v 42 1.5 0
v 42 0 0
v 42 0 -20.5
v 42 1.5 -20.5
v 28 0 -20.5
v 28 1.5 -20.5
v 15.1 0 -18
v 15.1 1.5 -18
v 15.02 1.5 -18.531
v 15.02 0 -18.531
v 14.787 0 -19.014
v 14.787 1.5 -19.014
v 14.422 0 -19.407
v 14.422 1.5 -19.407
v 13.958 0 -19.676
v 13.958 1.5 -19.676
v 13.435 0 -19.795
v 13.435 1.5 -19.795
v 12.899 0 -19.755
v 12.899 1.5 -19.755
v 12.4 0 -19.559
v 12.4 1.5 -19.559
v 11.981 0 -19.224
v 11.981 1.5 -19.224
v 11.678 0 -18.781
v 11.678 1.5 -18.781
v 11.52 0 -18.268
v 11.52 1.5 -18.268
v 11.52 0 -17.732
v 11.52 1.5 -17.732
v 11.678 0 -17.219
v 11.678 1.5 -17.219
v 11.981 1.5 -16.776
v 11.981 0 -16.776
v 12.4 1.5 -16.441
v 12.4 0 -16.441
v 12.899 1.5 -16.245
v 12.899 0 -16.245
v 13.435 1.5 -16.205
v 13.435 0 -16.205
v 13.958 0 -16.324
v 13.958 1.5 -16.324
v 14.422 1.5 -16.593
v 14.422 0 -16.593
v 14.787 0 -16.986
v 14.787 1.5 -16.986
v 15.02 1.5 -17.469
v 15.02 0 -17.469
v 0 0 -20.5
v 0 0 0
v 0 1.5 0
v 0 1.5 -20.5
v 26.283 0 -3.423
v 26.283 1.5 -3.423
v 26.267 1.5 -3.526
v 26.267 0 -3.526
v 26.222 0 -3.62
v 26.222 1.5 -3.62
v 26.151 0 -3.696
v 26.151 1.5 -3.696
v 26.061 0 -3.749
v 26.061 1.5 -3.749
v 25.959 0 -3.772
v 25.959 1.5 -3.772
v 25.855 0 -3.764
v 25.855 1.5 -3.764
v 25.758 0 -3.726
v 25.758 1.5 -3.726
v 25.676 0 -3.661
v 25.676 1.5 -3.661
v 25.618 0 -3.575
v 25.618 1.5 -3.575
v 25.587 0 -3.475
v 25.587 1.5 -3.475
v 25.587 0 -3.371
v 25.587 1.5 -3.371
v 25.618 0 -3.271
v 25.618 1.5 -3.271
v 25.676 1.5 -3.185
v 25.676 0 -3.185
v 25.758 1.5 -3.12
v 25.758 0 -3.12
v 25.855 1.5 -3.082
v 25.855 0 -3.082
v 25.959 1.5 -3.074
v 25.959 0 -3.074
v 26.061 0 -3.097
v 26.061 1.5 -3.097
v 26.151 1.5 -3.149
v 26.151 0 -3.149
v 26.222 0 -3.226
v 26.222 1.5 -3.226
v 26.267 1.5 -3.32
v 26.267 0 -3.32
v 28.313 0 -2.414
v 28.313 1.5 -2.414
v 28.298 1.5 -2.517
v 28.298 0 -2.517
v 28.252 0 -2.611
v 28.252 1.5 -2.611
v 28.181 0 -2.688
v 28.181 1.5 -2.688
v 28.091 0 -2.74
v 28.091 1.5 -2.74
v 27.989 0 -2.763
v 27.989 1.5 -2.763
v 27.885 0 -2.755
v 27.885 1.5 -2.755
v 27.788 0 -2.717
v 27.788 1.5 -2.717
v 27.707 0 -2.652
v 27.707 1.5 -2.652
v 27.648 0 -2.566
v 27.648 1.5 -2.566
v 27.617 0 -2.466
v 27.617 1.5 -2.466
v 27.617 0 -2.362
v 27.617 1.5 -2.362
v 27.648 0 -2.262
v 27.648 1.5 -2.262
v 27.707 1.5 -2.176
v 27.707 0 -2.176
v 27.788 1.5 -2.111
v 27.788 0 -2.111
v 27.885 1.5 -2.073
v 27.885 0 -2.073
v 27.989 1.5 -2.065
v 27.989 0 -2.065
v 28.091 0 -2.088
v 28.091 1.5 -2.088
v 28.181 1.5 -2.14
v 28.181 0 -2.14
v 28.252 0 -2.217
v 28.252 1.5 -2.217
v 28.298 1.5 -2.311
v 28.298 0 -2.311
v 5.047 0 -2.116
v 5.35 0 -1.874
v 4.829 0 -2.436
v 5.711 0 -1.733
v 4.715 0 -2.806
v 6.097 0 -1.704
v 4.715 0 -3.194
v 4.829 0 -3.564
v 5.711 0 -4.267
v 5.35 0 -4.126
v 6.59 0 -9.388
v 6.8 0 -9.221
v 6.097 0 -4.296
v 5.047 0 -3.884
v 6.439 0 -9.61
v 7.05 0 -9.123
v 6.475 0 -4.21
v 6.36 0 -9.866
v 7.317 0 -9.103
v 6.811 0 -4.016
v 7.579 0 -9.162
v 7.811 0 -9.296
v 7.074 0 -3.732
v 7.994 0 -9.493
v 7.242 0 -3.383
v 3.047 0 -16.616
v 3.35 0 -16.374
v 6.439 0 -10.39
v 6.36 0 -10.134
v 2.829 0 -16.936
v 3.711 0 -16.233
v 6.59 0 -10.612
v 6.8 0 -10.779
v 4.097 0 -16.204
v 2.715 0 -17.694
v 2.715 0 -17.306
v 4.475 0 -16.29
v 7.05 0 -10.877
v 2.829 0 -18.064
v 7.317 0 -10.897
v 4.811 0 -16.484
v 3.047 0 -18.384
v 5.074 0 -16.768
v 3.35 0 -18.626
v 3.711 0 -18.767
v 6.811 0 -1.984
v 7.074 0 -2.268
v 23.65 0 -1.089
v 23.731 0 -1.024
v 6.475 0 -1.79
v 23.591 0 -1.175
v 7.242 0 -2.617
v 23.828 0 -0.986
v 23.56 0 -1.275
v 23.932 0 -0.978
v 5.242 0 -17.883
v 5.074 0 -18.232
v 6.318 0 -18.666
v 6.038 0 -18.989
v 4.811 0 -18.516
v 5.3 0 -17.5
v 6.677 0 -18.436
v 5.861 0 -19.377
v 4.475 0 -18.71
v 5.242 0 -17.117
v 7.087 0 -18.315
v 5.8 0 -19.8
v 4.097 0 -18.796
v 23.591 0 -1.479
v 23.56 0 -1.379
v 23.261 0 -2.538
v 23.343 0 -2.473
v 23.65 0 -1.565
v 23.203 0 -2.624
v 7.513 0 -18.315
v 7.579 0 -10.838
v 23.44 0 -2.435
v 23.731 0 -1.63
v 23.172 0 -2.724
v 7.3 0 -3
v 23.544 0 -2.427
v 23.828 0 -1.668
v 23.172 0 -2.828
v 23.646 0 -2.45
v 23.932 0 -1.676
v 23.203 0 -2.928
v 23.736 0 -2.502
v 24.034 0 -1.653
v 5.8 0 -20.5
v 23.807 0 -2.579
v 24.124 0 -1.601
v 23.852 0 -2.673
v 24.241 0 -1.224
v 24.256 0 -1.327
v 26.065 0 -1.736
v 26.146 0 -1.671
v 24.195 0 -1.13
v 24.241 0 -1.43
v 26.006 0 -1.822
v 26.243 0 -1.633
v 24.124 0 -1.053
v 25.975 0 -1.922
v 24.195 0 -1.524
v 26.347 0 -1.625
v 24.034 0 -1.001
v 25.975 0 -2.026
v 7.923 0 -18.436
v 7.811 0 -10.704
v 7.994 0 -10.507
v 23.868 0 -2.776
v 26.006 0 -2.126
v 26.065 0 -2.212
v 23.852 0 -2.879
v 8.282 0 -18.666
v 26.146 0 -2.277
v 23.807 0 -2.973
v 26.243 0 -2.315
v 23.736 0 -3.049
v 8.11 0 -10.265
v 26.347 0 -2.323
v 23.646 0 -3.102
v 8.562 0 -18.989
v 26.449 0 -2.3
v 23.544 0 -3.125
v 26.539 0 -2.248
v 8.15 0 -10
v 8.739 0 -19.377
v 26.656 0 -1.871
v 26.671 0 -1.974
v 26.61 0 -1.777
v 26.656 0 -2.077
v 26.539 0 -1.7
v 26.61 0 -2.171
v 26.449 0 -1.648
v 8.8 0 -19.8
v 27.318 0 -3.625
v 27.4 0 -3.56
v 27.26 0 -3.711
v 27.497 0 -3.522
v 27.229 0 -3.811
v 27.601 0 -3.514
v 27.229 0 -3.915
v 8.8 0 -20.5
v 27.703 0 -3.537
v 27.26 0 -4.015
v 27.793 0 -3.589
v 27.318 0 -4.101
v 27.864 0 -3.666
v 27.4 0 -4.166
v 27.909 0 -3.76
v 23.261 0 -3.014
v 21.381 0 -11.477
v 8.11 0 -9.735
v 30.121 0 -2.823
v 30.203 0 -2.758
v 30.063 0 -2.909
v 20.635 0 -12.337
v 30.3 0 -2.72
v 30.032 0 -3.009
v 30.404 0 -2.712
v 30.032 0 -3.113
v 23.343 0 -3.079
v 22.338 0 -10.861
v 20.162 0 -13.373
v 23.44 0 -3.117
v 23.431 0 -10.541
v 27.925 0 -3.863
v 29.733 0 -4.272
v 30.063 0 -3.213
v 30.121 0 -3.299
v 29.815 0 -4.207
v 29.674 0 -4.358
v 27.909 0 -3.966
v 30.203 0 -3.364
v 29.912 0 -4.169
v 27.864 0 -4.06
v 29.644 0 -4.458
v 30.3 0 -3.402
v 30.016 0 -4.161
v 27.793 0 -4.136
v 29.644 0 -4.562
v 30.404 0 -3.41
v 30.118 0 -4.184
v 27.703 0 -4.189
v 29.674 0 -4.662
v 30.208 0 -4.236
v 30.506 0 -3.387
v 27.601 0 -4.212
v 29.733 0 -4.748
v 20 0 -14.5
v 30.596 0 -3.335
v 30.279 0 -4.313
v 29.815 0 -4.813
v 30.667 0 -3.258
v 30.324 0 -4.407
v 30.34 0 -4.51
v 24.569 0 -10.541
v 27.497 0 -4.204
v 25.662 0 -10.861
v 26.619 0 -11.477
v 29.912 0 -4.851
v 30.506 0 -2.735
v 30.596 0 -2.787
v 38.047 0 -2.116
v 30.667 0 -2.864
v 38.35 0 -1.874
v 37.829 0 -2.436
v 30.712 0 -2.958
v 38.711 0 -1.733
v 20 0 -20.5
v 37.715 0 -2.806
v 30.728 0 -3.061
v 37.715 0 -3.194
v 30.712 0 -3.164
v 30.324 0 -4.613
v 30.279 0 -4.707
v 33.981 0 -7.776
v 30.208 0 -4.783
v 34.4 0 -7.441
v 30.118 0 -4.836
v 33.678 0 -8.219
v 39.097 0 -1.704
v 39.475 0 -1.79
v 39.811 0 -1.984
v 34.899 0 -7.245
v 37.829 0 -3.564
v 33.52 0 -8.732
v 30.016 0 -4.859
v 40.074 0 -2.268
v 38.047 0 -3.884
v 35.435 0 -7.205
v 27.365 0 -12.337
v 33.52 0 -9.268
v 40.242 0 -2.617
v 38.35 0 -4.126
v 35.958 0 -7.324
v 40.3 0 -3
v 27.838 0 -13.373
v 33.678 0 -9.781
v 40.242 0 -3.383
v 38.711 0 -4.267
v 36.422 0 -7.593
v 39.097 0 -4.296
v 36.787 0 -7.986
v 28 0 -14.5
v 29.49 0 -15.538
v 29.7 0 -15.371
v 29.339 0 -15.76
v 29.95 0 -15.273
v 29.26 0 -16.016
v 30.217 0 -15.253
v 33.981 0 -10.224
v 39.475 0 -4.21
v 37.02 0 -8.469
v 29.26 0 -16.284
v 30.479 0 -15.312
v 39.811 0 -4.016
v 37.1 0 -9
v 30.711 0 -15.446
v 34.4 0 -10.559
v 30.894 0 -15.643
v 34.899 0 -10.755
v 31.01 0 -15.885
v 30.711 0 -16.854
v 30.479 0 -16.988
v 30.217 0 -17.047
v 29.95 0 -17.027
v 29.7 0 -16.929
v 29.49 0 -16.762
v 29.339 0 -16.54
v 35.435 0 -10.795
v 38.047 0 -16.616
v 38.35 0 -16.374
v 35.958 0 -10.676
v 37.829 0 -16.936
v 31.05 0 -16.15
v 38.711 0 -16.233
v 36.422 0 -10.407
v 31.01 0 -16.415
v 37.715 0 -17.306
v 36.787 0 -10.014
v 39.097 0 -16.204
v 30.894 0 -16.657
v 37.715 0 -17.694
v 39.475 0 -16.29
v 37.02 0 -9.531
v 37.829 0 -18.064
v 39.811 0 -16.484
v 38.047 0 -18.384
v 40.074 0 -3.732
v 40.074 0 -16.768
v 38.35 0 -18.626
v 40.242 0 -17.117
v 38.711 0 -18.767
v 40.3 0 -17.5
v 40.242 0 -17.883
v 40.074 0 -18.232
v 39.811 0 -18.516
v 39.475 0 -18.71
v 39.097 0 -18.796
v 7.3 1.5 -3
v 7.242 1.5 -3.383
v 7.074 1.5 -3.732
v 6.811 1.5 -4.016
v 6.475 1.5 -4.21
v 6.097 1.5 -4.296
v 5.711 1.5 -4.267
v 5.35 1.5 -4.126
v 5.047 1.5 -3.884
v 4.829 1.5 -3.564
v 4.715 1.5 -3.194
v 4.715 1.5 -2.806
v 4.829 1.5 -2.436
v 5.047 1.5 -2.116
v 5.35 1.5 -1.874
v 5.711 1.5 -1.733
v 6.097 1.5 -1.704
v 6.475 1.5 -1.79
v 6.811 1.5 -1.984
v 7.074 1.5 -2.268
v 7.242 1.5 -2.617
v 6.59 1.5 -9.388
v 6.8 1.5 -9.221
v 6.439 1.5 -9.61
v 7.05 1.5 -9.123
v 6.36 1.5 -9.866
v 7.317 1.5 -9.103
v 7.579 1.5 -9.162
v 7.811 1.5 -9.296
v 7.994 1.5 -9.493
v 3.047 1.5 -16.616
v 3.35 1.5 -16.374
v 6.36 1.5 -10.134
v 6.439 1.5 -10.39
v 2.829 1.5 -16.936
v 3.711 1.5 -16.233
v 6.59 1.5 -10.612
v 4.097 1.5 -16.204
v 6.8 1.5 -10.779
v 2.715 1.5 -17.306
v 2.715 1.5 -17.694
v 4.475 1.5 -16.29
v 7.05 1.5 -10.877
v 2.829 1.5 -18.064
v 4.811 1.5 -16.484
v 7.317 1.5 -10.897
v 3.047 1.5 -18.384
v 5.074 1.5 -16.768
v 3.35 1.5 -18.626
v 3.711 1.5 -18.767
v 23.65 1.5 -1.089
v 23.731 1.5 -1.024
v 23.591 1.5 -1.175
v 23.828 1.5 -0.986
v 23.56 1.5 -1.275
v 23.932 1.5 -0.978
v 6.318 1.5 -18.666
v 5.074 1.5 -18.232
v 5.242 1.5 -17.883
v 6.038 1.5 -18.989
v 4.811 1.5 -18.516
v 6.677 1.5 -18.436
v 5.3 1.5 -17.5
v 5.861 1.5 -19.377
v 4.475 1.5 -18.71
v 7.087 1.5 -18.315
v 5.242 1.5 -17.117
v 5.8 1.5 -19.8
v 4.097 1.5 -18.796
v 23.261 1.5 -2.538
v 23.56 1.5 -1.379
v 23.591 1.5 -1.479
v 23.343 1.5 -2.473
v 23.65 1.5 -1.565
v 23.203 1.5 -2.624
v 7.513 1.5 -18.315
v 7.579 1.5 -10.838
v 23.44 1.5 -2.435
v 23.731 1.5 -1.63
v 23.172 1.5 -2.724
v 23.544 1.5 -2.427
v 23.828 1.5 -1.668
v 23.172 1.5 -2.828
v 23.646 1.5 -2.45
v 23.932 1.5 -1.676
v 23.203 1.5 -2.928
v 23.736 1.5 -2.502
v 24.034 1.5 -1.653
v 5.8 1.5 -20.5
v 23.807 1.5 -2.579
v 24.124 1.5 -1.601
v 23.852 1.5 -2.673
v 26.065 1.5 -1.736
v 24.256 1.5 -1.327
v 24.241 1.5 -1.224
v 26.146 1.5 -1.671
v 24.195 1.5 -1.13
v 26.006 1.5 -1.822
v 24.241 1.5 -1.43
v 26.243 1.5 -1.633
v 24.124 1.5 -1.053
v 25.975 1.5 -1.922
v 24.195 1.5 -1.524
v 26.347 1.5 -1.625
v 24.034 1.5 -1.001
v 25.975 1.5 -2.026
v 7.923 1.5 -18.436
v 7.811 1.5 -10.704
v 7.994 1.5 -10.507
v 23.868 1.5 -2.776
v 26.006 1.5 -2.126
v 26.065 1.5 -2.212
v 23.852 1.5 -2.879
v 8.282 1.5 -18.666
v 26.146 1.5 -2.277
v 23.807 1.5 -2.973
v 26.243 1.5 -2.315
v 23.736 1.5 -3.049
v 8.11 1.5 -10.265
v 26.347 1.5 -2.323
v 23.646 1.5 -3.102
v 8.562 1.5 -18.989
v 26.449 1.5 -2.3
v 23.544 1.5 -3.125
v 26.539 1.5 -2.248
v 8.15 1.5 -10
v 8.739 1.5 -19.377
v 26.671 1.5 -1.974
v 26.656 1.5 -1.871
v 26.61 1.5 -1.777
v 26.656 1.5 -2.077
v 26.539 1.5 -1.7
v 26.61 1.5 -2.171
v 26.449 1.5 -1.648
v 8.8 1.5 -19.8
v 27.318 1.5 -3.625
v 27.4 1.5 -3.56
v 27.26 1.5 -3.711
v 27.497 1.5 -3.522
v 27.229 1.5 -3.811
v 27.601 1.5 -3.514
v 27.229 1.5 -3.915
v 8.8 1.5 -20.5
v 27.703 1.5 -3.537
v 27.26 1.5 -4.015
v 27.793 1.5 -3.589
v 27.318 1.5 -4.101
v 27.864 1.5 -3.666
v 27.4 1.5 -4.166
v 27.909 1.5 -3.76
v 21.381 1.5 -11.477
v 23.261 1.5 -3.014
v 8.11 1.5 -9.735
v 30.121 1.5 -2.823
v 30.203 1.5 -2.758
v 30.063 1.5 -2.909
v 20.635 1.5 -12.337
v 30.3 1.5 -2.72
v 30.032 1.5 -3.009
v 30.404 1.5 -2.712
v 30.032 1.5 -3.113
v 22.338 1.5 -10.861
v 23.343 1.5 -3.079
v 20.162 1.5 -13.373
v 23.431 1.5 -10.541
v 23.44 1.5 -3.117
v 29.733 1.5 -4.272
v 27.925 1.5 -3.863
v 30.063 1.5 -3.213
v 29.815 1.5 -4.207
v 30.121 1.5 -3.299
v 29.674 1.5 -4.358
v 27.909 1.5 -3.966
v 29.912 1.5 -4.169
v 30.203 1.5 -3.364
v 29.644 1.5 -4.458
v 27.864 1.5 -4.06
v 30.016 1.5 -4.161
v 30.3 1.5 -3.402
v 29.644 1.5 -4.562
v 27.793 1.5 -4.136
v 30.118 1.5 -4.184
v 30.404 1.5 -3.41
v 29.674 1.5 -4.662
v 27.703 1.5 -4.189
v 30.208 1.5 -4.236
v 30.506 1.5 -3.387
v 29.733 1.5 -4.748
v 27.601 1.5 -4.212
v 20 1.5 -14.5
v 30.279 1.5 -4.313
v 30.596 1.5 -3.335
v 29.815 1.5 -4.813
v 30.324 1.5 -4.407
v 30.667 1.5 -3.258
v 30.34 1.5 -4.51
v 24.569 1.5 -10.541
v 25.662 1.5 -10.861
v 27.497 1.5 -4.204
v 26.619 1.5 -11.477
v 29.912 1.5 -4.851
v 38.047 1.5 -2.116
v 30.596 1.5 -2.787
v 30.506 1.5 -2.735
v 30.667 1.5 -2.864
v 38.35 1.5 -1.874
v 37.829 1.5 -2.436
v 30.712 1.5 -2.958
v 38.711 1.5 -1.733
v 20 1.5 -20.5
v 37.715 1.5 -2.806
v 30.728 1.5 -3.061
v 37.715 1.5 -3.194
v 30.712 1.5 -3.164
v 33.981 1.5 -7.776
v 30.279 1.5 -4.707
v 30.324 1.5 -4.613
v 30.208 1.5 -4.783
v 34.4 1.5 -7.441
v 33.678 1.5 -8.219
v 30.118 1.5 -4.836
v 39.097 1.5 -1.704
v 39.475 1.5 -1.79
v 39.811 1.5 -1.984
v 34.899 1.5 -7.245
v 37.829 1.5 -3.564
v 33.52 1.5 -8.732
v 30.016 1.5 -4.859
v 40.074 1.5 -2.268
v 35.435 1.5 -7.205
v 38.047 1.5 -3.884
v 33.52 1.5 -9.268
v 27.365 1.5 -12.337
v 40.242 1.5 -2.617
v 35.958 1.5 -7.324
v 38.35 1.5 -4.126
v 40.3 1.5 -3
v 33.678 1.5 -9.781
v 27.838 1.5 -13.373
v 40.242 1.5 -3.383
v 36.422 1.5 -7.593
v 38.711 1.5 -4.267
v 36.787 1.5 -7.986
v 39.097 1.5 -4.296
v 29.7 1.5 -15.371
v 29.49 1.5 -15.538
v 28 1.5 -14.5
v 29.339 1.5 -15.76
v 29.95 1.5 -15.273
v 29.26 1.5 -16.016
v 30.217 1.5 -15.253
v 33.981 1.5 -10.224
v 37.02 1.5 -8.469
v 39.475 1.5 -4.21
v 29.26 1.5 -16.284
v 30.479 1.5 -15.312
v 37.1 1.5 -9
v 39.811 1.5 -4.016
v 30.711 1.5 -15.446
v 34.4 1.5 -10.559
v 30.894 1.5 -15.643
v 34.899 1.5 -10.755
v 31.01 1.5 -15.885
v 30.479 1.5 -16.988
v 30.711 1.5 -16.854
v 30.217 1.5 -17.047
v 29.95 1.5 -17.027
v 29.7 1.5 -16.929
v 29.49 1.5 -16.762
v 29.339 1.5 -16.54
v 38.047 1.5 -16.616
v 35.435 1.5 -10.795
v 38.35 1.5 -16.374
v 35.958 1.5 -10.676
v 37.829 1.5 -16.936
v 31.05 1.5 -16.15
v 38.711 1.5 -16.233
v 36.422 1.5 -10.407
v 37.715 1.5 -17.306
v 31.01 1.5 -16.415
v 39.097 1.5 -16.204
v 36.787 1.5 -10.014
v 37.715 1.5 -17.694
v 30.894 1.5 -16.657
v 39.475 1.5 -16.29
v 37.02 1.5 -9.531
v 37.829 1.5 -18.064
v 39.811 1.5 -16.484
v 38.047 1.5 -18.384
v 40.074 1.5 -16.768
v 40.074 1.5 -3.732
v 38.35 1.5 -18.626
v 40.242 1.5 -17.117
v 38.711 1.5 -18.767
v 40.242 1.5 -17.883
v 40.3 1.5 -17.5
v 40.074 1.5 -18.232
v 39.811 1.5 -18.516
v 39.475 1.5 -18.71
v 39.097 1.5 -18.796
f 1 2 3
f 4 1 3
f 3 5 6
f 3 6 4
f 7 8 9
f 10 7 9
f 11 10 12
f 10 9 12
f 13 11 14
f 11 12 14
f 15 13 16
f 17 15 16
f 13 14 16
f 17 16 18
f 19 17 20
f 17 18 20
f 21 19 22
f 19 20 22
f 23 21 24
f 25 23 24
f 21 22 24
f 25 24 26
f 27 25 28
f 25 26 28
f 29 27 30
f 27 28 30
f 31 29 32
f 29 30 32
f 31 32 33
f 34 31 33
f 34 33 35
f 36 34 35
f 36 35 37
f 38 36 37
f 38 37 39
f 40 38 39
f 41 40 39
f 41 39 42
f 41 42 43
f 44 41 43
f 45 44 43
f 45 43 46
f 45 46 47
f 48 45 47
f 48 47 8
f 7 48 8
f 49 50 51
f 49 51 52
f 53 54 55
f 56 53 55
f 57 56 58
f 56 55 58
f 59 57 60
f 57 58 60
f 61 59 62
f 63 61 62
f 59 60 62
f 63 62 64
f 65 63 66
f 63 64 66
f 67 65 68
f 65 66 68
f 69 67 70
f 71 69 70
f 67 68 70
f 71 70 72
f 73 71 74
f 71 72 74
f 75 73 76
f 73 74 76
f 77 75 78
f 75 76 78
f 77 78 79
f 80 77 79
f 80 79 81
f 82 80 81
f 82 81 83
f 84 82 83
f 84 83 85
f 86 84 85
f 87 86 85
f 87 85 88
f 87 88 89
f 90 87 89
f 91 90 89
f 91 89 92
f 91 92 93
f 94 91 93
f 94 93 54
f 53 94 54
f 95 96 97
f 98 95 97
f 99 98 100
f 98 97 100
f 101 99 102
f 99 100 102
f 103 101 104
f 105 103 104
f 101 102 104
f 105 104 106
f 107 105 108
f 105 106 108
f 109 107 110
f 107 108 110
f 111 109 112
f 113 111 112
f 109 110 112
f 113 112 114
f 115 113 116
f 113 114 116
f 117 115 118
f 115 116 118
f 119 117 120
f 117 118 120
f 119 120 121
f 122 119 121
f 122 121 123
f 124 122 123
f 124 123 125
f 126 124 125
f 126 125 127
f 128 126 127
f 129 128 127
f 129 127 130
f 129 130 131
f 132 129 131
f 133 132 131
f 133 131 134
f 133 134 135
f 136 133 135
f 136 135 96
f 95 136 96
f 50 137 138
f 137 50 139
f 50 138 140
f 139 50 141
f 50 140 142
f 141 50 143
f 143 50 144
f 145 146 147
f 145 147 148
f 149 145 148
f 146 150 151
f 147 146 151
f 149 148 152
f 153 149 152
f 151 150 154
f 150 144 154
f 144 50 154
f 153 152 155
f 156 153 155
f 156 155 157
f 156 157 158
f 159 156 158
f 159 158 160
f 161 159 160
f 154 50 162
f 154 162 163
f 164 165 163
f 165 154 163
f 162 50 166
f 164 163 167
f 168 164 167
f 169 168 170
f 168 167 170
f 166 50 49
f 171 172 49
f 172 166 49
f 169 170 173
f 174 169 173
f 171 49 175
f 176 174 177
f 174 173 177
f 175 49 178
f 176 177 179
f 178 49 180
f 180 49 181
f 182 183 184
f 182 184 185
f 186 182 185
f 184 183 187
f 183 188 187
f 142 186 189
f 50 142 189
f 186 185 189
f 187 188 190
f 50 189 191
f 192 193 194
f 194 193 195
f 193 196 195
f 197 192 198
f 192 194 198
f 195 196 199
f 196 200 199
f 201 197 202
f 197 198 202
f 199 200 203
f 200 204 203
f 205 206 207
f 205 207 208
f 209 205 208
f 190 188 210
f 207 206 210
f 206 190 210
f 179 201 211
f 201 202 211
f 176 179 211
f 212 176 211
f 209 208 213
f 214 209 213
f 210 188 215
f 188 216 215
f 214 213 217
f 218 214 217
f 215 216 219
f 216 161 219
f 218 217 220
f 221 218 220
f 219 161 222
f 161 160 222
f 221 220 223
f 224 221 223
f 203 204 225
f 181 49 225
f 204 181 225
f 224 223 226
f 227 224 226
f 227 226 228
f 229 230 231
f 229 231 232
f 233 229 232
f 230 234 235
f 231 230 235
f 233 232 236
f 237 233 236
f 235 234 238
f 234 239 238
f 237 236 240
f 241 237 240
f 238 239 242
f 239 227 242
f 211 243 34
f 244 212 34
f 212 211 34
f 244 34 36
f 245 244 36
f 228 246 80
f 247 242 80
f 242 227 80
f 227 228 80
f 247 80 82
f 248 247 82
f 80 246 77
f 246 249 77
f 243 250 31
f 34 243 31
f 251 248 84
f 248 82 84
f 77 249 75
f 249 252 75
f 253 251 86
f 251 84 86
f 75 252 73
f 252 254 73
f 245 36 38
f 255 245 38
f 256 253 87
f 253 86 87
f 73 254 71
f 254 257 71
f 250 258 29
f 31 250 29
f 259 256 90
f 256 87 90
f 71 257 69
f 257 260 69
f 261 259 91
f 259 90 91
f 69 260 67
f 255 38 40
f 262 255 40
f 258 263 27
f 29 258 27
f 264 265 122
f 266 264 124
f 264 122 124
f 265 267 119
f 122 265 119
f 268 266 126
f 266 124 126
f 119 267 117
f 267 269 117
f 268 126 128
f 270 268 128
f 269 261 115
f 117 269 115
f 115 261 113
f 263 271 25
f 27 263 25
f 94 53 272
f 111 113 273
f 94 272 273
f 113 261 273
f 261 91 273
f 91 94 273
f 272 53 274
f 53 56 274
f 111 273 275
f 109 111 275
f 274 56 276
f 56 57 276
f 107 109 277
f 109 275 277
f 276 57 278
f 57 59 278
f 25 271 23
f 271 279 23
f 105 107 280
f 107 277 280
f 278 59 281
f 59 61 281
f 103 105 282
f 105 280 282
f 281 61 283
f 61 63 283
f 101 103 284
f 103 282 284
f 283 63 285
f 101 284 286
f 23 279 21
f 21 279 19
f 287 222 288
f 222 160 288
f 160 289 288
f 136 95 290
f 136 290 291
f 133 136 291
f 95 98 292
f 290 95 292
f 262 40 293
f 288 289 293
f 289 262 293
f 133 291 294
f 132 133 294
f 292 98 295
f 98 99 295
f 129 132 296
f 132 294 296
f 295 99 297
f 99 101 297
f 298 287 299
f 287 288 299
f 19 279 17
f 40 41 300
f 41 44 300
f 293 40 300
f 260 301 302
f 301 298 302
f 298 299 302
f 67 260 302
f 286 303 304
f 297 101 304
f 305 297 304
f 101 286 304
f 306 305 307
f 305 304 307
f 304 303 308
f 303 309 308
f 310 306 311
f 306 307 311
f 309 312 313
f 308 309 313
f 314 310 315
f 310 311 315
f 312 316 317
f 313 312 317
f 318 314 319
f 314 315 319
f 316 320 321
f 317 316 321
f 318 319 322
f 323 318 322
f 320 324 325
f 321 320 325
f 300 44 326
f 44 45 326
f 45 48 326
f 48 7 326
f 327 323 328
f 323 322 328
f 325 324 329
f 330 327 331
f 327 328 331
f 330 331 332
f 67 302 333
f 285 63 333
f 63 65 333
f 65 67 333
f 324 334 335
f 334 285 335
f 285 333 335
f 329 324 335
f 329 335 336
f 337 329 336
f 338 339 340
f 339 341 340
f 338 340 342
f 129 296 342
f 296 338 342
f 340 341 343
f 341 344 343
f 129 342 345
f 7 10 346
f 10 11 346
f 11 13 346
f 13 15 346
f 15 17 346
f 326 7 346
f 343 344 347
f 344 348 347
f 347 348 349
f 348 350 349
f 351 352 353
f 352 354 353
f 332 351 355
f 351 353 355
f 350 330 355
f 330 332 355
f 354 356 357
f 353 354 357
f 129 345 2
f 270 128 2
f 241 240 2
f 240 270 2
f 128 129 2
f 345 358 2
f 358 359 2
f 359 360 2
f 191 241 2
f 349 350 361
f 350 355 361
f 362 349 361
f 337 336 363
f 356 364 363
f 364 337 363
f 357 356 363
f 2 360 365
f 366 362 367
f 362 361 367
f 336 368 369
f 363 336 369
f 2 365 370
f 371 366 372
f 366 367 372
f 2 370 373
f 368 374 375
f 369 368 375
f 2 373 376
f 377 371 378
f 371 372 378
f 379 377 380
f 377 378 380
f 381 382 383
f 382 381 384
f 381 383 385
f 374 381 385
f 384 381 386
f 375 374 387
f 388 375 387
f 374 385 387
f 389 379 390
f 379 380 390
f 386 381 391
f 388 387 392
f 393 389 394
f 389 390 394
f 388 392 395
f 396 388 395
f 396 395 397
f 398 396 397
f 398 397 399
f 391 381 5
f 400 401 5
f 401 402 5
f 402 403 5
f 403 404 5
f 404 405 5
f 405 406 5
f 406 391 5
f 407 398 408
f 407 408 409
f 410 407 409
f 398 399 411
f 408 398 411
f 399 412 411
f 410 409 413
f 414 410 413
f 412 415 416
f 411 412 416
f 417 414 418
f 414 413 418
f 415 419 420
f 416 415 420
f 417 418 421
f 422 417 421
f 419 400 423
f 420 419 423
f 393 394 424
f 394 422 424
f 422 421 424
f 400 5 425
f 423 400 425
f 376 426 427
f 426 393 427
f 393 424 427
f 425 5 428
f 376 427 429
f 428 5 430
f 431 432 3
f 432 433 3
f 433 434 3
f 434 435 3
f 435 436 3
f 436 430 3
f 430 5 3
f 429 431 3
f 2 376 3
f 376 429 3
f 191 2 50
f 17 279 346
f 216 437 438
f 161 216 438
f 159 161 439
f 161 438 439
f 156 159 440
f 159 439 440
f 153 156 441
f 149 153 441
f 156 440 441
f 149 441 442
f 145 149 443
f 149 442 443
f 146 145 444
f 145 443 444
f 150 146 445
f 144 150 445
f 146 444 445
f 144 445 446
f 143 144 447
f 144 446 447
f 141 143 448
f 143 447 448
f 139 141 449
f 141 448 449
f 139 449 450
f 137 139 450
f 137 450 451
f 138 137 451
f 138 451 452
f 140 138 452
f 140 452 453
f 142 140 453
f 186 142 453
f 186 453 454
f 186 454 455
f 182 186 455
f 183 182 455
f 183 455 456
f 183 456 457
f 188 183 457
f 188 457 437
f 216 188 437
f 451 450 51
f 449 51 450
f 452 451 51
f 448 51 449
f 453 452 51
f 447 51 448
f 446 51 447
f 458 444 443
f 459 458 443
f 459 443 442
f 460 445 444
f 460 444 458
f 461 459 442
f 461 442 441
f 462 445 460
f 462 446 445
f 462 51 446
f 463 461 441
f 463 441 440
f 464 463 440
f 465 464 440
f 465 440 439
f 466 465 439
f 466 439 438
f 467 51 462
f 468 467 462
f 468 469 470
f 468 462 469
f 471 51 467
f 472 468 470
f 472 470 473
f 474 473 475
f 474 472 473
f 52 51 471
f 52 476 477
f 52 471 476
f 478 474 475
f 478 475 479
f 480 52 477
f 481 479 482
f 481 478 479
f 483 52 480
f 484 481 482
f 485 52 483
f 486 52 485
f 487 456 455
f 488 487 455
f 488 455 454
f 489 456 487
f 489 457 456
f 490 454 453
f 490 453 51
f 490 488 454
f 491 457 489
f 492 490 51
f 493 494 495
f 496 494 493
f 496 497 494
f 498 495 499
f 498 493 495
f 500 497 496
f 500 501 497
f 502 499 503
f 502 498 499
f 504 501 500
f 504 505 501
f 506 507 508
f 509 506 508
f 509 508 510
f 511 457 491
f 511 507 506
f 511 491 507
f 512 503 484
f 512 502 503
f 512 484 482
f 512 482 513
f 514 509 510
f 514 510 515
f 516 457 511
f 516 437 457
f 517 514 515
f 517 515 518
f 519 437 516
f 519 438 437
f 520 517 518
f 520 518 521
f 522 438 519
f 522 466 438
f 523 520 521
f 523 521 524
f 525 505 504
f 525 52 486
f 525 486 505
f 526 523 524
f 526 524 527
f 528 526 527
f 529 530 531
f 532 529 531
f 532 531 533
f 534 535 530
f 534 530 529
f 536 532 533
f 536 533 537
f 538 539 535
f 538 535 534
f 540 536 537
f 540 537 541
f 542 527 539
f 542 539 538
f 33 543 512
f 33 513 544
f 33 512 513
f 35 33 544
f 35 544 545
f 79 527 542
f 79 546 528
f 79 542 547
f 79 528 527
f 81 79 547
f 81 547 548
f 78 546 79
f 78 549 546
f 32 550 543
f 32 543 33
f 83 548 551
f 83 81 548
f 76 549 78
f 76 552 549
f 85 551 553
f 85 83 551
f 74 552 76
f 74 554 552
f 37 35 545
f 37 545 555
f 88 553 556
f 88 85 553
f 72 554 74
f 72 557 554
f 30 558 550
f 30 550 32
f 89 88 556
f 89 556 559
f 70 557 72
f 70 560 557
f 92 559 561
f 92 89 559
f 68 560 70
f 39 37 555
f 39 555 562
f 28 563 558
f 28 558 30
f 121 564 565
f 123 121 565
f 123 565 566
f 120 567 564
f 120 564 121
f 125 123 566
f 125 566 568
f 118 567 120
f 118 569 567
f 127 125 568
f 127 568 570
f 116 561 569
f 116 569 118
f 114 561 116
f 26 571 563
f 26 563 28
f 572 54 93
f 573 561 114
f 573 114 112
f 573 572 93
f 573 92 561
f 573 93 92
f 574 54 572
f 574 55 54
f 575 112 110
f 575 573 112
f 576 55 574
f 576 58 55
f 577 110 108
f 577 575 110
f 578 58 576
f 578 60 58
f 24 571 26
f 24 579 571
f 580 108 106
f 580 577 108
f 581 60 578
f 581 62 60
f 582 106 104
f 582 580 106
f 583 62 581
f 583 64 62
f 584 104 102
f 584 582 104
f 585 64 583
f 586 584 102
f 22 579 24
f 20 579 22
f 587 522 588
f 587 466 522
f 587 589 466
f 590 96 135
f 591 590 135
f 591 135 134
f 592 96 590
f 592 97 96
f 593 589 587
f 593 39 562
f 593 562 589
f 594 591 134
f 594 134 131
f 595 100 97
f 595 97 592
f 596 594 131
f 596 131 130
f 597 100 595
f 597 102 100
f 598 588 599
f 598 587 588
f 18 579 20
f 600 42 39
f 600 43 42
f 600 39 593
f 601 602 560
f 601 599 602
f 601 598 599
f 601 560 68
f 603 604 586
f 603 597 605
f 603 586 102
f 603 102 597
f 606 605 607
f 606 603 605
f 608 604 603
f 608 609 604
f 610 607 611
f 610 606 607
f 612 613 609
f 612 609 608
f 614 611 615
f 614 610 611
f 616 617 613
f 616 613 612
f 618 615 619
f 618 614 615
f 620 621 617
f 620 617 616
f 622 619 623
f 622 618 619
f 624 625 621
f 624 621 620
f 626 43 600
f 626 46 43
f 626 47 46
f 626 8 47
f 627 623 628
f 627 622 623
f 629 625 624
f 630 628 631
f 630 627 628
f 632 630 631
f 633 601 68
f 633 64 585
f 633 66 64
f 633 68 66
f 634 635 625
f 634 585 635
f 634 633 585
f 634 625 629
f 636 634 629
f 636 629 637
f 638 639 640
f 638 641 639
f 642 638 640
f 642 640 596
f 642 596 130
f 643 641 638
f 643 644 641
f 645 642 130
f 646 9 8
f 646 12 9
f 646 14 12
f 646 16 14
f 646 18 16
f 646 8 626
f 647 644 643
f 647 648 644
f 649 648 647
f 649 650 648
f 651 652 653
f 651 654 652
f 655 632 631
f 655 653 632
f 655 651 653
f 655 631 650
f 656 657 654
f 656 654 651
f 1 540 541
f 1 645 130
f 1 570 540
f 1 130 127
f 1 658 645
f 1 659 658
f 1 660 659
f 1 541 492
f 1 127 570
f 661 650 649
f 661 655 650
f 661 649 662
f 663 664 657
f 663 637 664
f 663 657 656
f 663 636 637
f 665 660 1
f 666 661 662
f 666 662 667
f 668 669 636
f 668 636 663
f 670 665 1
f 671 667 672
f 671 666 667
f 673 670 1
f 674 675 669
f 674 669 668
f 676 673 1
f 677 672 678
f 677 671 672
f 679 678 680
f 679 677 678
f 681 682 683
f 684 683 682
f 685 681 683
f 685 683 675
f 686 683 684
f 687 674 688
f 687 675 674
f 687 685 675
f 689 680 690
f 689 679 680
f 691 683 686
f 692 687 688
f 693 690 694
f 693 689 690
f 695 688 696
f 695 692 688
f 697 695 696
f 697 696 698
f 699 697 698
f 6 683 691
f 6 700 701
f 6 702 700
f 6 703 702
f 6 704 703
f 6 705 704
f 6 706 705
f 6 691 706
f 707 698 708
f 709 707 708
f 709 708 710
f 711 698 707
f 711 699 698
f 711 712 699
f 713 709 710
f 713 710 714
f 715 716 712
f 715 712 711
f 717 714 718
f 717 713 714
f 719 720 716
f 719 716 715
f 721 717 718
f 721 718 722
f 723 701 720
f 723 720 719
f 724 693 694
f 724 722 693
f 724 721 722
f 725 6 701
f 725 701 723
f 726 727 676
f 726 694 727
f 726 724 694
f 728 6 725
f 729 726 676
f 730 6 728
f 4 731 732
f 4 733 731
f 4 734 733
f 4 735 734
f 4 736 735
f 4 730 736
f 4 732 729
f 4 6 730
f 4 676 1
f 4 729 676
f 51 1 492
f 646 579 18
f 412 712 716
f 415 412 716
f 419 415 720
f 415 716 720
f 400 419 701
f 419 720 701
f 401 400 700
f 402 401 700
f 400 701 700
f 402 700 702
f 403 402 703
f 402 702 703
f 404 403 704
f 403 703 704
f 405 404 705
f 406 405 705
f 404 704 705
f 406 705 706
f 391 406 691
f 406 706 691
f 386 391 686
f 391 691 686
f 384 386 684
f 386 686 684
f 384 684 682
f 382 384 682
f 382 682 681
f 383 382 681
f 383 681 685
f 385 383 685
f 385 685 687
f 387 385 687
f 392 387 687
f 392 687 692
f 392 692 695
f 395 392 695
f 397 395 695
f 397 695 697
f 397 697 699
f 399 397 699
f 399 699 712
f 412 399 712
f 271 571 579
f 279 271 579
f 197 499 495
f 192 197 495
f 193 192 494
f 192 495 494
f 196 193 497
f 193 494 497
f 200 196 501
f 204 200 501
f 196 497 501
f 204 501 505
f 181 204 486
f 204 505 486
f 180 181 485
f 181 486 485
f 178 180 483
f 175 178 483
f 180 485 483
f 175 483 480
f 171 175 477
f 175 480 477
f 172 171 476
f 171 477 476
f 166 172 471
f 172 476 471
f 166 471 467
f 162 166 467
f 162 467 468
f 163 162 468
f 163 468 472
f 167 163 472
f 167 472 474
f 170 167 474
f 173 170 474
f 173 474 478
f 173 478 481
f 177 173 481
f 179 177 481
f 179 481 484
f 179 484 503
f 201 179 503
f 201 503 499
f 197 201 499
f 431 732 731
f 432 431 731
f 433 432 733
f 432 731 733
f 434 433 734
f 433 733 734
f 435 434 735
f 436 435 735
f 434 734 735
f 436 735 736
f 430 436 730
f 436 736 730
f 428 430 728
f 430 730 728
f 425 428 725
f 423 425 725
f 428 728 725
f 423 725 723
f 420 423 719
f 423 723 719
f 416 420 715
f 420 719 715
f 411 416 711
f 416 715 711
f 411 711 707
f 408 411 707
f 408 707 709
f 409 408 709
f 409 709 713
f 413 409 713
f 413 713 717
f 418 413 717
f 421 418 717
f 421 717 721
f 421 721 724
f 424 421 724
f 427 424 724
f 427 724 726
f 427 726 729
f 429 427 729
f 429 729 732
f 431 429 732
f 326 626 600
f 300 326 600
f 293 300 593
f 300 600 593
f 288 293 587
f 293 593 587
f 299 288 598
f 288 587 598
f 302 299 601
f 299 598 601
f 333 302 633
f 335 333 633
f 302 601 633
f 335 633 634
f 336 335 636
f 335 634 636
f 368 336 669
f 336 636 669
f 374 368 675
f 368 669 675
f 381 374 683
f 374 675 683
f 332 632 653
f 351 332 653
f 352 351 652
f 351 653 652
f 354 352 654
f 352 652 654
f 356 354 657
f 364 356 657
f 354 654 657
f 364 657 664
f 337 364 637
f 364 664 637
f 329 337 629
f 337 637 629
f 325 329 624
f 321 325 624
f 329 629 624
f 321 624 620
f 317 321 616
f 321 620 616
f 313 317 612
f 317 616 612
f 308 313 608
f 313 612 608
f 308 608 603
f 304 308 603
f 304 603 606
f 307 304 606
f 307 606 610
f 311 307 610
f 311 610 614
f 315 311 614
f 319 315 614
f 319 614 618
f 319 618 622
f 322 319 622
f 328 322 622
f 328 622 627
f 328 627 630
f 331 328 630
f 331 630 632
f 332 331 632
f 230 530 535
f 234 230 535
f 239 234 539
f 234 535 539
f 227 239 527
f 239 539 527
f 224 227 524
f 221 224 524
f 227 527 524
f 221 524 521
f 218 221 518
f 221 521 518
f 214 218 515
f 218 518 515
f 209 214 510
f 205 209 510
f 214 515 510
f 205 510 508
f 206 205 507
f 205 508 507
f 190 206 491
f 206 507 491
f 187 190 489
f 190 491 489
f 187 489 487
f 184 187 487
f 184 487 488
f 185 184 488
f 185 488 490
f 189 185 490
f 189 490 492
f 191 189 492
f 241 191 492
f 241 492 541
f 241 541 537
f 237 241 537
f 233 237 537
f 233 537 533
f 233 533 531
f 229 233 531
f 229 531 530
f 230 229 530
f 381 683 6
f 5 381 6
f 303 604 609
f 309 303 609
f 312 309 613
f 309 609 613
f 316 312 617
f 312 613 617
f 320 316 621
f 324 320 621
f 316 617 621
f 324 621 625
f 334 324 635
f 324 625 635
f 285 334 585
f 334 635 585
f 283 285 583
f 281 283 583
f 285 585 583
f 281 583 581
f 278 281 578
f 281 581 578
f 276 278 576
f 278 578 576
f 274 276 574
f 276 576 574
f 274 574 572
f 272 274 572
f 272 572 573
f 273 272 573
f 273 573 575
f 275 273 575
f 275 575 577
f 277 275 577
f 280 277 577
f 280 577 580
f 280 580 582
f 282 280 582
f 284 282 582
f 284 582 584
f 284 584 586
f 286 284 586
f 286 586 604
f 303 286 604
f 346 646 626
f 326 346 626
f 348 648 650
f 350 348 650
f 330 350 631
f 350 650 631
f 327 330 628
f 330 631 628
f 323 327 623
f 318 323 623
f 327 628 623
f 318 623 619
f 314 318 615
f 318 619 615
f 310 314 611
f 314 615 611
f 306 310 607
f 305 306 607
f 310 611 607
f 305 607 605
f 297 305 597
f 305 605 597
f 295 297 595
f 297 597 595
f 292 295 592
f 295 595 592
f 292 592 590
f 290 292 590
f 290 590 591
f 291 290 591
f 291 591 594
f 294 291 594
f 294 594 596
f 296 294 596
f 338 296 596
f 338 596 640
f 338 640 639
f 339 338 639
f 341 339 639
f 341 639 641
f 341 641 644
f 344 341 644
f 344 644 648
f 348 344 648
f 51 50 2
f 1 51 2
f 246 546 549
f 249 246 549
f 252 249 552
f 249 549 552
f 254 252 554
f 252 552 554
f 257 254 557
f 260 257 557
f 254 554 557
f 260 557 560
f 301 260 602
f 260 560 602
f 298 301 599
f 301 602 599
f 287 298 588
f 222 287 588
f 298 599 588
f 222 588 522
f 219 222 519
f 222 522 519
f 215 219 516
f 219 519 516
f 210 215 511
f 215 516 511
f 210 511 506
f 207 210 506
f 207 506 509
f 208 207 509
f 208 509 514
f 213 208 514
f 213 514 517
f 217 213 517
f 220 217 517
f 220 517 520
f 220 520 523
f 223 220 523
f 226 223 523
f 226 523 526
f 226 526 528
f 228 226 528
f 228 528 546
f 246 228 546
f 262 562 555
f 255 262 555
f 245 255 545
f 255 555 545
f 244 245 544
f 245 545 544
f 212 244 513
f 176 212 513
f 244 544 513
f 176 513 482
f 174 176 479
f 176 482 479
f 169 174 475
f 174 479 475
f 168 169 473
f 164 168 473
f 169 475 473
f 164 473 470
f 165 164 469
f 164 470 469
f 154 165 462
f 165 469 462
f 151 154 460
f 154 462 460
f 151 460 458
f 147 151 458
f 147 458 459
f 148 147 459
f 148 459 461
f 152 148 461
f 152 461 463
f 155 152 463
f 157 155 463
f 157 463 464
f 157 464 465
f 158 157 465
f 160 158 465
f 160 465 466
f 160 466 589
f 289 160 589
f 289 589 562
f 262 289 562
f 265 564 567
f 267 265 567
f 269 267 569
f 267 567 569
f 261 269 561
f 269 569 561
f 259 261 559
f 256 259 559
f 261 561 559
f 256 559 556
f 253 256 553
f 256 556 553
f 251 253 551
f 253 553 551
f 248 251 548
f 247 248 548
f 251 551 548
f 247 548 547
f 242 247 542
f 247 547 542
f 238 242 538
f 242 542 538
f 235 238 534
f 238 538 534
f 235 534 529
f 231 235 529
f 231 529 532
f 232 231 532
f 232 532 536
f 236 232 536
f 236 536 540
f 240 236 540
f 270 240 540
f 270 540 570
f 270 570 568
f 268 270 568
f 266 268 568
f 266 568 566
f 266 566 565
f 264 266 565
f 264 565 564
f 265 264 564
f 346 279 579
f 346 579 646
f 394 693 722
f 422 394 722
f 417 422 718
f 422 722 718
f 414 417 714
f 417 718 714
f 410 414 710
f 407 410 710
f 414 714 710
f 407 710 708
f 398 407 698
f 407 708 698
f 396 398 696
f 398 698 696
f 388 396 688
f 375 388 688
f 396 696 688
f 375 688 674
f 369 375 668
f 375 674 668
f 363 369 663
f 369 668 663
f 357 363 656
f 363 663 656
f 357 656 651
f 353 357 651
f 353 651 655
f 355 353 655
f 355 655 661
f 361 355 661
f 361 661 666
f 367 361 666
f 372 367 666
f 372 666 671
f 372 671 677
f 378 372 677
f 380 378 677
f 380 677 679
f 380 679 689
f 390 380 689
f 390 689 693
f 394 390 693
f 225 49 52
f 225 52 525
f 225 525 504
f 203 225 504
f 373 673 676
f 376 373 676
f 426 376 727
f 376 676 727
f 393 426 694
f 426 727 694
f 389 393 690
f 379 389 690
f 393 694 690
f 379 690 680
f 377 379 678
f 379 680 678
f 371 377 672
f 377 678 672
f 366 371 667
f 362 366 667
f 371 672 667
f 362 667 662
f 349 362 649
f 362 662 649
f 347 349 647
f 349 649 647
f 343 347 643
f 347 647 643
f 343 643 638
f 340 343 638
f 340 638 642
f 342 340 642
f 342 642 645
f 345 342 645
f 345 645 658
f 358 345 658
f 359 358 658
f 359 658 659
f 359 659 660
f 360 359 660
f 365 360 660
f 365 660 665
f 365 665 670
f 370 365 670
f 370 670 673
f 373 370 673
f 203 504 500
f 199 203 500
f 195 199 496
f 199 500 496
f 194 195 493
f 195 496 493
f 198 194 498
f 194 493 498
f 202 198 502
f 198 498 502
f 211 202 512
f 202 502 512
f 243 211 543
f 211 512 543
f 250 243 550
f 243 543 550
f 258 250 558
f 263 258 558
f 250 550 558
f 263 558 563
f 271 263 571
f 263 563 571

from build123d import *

# Parameters (mm, degrees)
SKETCH_1_W          = 42
SKETCH_1_H          = 20.5
EXTRUDE_1_DEPTH     = 1.5
SKETCH_2_R          = 4
CUT_EXTRUDE_1_DEPTH = 2.5
CUT_EXTRUDE_3_REACH = 3.5
SKETCH_4_R          = 0.9
SKETCH_4_R_2        = 1.3
SKETCH_4_R_3        = 1.8
SKETCH_5_R          = 0.35
CUT_EXTRUDE_4_DEPTH = 2.5


with BuildPart() as part:
    # Эскиз1 → Бобышка-Вытянуть1 (new body)
    with BuildSketch(Plane(origin=(0, 0, 0), x_dir=(1, 0, 0), z_dir=(0, 1, 0))):
        with Locations((21, 10.25)):
            Rectangle(SKETCH_1_W, SKETCH_1_H)
    extrude(amount=EXTRUDE_1_DEPTH)

    # Эскиз2 → Вырез-Вытянуть1 (cut, through all)
    with BuildSketch(Plane(origin=(0, 1.5, 0), x_dir=(1, 0, 0), z_dir=(0, 1, 0))):
        with Locations((24, 14.5)):
            Circle(SKETCH_2_R)
        with BuildLine():
            Line((20, 20.5), (20, 14.5))
            ThreePointArc((20, 14.5), (24, 18.5), (28, 14.5))
            Line((28, 14.5), (28, 20.5))
            Line((28, 20.5), (20, 20.5))
        make_face()
    extrude(amount=-CUT_EXTRUDE_1_DEPTH, mode=Mode.SUBTRACT)

    # Эскиз4 → Вырез-Вытянуть3 (cut, up to next)
    with BuildSketch(Plane(origin=(0, 1.5, 0), x_dir=(1, 0, 0), z_dir=(0, 1, 0)), mode=Mode.PRIVATE) as cut_extrude_3_sk1:
        with BuildLine():
            Line((5.8, 20.5), (5.8, 19.8))
            ThreePointArc((5.8, 19.8), (7.3, 18.3), (8.8, 19.8))
            Line((8.8, 19.8), (8.8, 20.5))
            Line((8.8, 20.5), (5.8, 20.5))
        make_face()
    cut_extrude_3_tool1 = extrude(cut_extrude_3_sk1.sketch, amount=-CUT_EXTRUDE_3_REACH, mode=Mode.PRIVATE) & part.part
    add(cut_extrude_3_tool1.solids().sort_by_distance((7.3, 1.5, -19.531111))[0], mode=Mode.SUBTRACT)
    # Эскиз4 → Вырез-Вытянуть3 (cut, up to next)
    with BuildSketch(Plane(origin=(0, 1.5, 0), x_dir=(1, 0, 0), z_dir=(0, 1, 0)), mode=Mode.PRIVATE) as cut_extrude_3_sk2:
        with Locations((7.25, 10)):
            Circle(SKETCH_4_R)
    cut_extrude_3_tool2 = extrude(cut_extrude_3_sk2.sketch, amount=-CUT_EXTRUDE_3_REACH, mode=Mode.PRIVATE) & part.part
    add(cut_extrude_3_tool2.solids().sort_by_distance((7.25, 1.5, -10))[0], mode=Mode.SUBTRACT)
    # Эскиз4 → Вырез-Вытянуть3 (cut, up to next)
    with BuildSketch(Plane(origin=(0, 1.5, 0), x_dir=(1, 0, 0), z_dir=(0, 1, 0)), mode=Mode.PRIVATE) as cut_extrude_3_sk3:
        with Locations((30.15, 16.15)):
            Circle(SKETCH_4_R)
    cut_extrude_3_tool3 = extrude(cut_extrude_3_sk3.sketch, amount=-CUT_EXTRUDE_3_REACH, mode=Mode.PRIVATE) & part.part
    add(cut_extrude_3_tool3.solids().sort_by_distance((30.15, 1.5, -16.15))[0], mode=Mode.SUBTRACT)
    # Эскиз4 → Вырез-Вытянуть3 (cut, up to next)
    with BuildSketch(Plane(origin=(0, 1.5, 0), x_dir=(1, 0, 0), z_dir=(0, 1, 0)), mode=Mode.PRIVATE) as cut_extrude_3_sk4:
        with Locations((39, 3)):
            Circle(SKETCH_4_R_2)
    cut_extrude_3_tool4 = extrude(cut_extrude_3_sk4.sketch, amount=-CUT_EXTRUDE_3_REACH, mode=Mode.PRIVATE) & part.part
    add(cut_extrude_3_tool4.solids().sort_by_distance((39, 1.5, -3))[0], mode=Mode.SUBTRACT)
    # Эскиз4 → Вырез-Вытянуть3 (cut, up to next)
    with BuildSketch(Plane(origin=(0, 1.5, 0), x_dir=(1, 0, 0), z_dir=(0, 1, 0)), mode=Mode.PRIVATE) as cut_extrude_3_sk5:
        with Locations((39, 17.5)):
            Circle(SKETCH_4_R_2)
    cut_extrude_3_tool5 = extrude(cut_extrude_3_sk5.sketch, amount=-CUT_EXTRUDE_3_REACH, mode=Mode.PRIVATE) & part.part
    add(cut_extrude_3_tool5.solids().sort_by_distance((39, 1.5, -17.5))[0], mode=Mode.SUBTRACT)
    # Эскиз4 → Вырез-Вытянуть3 (cut, up to next)
    with BuildSketch(Plane(origin=(0, 1.5, 0), x_dir=(1, 0, 0), z_dir=(0, 1, 0)), mode=Mode.PRIVATE) as cut_extrude_3_sk6:
        with Locations((6, 3)):
            Circle(SKETCH_4_R_2)
    cut_extrude_3_tool6 = extrude(cut_extrude_3_sk6.sketch, amount=-CUT_EXTRUDE_3_REACH, mode=Mode.PRIVATE) & part.part
    add(cut_extrude_3_tool6.solids().sort_by_distance((6, 1.5, -3))[0], mode=Mode.SUBTRACT)
    # Эскиз4 → Вырез-Вытянуть3 (cut, up to next)
    with BuildSketch(Plane(origin=(0, 1.5, 0), x_dir=(1, 0, 0), z_dir=(0, 1, 0)), mode=Mode.PRIVATE) as cut_extrude_3_sk7:
        with Locations((4, 17.5)):
            Circle(SKETCH_4_R_2)
    cut_extrude_3_tool7 = extrude(cut_extrude_3_sk7.sketch, amount=-CUT_EXTRUDE_3_REACH, mode=Mode.PRIVATE) & part.part
    add(cut_extrude_3_tool7.solids().sort_by_distance((4, 1.5, -17.5))[0], mode=Mode.SUBTRACT)
    # Эскиз4 → Вырез-Вытянуть3 (cut, up to next)
    with BuildSketch(Plane(origin=(0, 1.5, 0), x_dir=(1, 0, 0), z_dir=(0, 1, 0)), mode=Mode.PRIVATE) as cut_extrude_3_sk8:
        with Locations((13.3, 18)):
            Circle(SKETCH_4_R_3)
    cut_extrude_3_tool8 = extrude(cut_extrude_3_sk8.sketch, amount=-CUT_EXTRUDE_3_REACH, mode=Mode.PRIVATE) & part.part
    add(cut_extrude_3_tool8.solids().sort_by_distance((13.3, 1.5, -18))[0], mode=Mode.SUBTRACT)
    # Эскиз4 → Вырез-Вытянуть3 (cut, up to next)
    with BuildSketch(Plane(origin=(0, 1.5, 0), x_dir=(1, 0, 0), z_dir=(0, 1, 0)), mode=Mode.PRIVATE) as cut_extrude_3_sk9:
        with Locations((35.3, 9)):
            Circle(SKETCH_4_R_3)
    cut_extrude_3_tool9 = extrude(cut_extrude_3_sk9.sketch, amount=-CUT_EXTRUDE_3_REACH, mode=Mode.PRIVATE) & part.part
    add(cut_extrude_3_tool9.solids().sort_by_distance((35.3, 1.5, -9))[0], mode=Mode.SUBTRACT)

    # Эскиз5 → Вырез-Вытянуть4 (cut, through all)
    with BuildSketch(Plane(origin=(0, 1.5, 0), x_dir=(1, 0, 0), z_dir=(0, 1, 0))):
        with Locations((29.989735949, 4.50985169)):
            Circle(SKETCH_5_R)
        with Locations((27.574921384, 3.862804077)):
            Circle(SKETCH_5_R)
        with Locations((25.932847479, 3.4228117)):
            Circle(SKETCH_5_R)
        with Locations((23.518032913, 2.775764088)):
            Circle(SKETCH_5_R)
        with Locations((30.377964517, 3.06096295)):
            Circle(SKETCH_5_R)
        with Locations((27.963149951, 2.413915338)):
            Circle(SKETCH_5_R)
        with Locations((26.321076047, 1.973922961)):
            Circle(SKETCH_5_R)
        with Locations((23.906261481, 1.326875348)):
            Circle(SKETCH_5_R)
    extrude(amount=-CUT_EXTRUDE_4_DEPTH, mode=Mode.SUBTRACT)


solid = part.part
